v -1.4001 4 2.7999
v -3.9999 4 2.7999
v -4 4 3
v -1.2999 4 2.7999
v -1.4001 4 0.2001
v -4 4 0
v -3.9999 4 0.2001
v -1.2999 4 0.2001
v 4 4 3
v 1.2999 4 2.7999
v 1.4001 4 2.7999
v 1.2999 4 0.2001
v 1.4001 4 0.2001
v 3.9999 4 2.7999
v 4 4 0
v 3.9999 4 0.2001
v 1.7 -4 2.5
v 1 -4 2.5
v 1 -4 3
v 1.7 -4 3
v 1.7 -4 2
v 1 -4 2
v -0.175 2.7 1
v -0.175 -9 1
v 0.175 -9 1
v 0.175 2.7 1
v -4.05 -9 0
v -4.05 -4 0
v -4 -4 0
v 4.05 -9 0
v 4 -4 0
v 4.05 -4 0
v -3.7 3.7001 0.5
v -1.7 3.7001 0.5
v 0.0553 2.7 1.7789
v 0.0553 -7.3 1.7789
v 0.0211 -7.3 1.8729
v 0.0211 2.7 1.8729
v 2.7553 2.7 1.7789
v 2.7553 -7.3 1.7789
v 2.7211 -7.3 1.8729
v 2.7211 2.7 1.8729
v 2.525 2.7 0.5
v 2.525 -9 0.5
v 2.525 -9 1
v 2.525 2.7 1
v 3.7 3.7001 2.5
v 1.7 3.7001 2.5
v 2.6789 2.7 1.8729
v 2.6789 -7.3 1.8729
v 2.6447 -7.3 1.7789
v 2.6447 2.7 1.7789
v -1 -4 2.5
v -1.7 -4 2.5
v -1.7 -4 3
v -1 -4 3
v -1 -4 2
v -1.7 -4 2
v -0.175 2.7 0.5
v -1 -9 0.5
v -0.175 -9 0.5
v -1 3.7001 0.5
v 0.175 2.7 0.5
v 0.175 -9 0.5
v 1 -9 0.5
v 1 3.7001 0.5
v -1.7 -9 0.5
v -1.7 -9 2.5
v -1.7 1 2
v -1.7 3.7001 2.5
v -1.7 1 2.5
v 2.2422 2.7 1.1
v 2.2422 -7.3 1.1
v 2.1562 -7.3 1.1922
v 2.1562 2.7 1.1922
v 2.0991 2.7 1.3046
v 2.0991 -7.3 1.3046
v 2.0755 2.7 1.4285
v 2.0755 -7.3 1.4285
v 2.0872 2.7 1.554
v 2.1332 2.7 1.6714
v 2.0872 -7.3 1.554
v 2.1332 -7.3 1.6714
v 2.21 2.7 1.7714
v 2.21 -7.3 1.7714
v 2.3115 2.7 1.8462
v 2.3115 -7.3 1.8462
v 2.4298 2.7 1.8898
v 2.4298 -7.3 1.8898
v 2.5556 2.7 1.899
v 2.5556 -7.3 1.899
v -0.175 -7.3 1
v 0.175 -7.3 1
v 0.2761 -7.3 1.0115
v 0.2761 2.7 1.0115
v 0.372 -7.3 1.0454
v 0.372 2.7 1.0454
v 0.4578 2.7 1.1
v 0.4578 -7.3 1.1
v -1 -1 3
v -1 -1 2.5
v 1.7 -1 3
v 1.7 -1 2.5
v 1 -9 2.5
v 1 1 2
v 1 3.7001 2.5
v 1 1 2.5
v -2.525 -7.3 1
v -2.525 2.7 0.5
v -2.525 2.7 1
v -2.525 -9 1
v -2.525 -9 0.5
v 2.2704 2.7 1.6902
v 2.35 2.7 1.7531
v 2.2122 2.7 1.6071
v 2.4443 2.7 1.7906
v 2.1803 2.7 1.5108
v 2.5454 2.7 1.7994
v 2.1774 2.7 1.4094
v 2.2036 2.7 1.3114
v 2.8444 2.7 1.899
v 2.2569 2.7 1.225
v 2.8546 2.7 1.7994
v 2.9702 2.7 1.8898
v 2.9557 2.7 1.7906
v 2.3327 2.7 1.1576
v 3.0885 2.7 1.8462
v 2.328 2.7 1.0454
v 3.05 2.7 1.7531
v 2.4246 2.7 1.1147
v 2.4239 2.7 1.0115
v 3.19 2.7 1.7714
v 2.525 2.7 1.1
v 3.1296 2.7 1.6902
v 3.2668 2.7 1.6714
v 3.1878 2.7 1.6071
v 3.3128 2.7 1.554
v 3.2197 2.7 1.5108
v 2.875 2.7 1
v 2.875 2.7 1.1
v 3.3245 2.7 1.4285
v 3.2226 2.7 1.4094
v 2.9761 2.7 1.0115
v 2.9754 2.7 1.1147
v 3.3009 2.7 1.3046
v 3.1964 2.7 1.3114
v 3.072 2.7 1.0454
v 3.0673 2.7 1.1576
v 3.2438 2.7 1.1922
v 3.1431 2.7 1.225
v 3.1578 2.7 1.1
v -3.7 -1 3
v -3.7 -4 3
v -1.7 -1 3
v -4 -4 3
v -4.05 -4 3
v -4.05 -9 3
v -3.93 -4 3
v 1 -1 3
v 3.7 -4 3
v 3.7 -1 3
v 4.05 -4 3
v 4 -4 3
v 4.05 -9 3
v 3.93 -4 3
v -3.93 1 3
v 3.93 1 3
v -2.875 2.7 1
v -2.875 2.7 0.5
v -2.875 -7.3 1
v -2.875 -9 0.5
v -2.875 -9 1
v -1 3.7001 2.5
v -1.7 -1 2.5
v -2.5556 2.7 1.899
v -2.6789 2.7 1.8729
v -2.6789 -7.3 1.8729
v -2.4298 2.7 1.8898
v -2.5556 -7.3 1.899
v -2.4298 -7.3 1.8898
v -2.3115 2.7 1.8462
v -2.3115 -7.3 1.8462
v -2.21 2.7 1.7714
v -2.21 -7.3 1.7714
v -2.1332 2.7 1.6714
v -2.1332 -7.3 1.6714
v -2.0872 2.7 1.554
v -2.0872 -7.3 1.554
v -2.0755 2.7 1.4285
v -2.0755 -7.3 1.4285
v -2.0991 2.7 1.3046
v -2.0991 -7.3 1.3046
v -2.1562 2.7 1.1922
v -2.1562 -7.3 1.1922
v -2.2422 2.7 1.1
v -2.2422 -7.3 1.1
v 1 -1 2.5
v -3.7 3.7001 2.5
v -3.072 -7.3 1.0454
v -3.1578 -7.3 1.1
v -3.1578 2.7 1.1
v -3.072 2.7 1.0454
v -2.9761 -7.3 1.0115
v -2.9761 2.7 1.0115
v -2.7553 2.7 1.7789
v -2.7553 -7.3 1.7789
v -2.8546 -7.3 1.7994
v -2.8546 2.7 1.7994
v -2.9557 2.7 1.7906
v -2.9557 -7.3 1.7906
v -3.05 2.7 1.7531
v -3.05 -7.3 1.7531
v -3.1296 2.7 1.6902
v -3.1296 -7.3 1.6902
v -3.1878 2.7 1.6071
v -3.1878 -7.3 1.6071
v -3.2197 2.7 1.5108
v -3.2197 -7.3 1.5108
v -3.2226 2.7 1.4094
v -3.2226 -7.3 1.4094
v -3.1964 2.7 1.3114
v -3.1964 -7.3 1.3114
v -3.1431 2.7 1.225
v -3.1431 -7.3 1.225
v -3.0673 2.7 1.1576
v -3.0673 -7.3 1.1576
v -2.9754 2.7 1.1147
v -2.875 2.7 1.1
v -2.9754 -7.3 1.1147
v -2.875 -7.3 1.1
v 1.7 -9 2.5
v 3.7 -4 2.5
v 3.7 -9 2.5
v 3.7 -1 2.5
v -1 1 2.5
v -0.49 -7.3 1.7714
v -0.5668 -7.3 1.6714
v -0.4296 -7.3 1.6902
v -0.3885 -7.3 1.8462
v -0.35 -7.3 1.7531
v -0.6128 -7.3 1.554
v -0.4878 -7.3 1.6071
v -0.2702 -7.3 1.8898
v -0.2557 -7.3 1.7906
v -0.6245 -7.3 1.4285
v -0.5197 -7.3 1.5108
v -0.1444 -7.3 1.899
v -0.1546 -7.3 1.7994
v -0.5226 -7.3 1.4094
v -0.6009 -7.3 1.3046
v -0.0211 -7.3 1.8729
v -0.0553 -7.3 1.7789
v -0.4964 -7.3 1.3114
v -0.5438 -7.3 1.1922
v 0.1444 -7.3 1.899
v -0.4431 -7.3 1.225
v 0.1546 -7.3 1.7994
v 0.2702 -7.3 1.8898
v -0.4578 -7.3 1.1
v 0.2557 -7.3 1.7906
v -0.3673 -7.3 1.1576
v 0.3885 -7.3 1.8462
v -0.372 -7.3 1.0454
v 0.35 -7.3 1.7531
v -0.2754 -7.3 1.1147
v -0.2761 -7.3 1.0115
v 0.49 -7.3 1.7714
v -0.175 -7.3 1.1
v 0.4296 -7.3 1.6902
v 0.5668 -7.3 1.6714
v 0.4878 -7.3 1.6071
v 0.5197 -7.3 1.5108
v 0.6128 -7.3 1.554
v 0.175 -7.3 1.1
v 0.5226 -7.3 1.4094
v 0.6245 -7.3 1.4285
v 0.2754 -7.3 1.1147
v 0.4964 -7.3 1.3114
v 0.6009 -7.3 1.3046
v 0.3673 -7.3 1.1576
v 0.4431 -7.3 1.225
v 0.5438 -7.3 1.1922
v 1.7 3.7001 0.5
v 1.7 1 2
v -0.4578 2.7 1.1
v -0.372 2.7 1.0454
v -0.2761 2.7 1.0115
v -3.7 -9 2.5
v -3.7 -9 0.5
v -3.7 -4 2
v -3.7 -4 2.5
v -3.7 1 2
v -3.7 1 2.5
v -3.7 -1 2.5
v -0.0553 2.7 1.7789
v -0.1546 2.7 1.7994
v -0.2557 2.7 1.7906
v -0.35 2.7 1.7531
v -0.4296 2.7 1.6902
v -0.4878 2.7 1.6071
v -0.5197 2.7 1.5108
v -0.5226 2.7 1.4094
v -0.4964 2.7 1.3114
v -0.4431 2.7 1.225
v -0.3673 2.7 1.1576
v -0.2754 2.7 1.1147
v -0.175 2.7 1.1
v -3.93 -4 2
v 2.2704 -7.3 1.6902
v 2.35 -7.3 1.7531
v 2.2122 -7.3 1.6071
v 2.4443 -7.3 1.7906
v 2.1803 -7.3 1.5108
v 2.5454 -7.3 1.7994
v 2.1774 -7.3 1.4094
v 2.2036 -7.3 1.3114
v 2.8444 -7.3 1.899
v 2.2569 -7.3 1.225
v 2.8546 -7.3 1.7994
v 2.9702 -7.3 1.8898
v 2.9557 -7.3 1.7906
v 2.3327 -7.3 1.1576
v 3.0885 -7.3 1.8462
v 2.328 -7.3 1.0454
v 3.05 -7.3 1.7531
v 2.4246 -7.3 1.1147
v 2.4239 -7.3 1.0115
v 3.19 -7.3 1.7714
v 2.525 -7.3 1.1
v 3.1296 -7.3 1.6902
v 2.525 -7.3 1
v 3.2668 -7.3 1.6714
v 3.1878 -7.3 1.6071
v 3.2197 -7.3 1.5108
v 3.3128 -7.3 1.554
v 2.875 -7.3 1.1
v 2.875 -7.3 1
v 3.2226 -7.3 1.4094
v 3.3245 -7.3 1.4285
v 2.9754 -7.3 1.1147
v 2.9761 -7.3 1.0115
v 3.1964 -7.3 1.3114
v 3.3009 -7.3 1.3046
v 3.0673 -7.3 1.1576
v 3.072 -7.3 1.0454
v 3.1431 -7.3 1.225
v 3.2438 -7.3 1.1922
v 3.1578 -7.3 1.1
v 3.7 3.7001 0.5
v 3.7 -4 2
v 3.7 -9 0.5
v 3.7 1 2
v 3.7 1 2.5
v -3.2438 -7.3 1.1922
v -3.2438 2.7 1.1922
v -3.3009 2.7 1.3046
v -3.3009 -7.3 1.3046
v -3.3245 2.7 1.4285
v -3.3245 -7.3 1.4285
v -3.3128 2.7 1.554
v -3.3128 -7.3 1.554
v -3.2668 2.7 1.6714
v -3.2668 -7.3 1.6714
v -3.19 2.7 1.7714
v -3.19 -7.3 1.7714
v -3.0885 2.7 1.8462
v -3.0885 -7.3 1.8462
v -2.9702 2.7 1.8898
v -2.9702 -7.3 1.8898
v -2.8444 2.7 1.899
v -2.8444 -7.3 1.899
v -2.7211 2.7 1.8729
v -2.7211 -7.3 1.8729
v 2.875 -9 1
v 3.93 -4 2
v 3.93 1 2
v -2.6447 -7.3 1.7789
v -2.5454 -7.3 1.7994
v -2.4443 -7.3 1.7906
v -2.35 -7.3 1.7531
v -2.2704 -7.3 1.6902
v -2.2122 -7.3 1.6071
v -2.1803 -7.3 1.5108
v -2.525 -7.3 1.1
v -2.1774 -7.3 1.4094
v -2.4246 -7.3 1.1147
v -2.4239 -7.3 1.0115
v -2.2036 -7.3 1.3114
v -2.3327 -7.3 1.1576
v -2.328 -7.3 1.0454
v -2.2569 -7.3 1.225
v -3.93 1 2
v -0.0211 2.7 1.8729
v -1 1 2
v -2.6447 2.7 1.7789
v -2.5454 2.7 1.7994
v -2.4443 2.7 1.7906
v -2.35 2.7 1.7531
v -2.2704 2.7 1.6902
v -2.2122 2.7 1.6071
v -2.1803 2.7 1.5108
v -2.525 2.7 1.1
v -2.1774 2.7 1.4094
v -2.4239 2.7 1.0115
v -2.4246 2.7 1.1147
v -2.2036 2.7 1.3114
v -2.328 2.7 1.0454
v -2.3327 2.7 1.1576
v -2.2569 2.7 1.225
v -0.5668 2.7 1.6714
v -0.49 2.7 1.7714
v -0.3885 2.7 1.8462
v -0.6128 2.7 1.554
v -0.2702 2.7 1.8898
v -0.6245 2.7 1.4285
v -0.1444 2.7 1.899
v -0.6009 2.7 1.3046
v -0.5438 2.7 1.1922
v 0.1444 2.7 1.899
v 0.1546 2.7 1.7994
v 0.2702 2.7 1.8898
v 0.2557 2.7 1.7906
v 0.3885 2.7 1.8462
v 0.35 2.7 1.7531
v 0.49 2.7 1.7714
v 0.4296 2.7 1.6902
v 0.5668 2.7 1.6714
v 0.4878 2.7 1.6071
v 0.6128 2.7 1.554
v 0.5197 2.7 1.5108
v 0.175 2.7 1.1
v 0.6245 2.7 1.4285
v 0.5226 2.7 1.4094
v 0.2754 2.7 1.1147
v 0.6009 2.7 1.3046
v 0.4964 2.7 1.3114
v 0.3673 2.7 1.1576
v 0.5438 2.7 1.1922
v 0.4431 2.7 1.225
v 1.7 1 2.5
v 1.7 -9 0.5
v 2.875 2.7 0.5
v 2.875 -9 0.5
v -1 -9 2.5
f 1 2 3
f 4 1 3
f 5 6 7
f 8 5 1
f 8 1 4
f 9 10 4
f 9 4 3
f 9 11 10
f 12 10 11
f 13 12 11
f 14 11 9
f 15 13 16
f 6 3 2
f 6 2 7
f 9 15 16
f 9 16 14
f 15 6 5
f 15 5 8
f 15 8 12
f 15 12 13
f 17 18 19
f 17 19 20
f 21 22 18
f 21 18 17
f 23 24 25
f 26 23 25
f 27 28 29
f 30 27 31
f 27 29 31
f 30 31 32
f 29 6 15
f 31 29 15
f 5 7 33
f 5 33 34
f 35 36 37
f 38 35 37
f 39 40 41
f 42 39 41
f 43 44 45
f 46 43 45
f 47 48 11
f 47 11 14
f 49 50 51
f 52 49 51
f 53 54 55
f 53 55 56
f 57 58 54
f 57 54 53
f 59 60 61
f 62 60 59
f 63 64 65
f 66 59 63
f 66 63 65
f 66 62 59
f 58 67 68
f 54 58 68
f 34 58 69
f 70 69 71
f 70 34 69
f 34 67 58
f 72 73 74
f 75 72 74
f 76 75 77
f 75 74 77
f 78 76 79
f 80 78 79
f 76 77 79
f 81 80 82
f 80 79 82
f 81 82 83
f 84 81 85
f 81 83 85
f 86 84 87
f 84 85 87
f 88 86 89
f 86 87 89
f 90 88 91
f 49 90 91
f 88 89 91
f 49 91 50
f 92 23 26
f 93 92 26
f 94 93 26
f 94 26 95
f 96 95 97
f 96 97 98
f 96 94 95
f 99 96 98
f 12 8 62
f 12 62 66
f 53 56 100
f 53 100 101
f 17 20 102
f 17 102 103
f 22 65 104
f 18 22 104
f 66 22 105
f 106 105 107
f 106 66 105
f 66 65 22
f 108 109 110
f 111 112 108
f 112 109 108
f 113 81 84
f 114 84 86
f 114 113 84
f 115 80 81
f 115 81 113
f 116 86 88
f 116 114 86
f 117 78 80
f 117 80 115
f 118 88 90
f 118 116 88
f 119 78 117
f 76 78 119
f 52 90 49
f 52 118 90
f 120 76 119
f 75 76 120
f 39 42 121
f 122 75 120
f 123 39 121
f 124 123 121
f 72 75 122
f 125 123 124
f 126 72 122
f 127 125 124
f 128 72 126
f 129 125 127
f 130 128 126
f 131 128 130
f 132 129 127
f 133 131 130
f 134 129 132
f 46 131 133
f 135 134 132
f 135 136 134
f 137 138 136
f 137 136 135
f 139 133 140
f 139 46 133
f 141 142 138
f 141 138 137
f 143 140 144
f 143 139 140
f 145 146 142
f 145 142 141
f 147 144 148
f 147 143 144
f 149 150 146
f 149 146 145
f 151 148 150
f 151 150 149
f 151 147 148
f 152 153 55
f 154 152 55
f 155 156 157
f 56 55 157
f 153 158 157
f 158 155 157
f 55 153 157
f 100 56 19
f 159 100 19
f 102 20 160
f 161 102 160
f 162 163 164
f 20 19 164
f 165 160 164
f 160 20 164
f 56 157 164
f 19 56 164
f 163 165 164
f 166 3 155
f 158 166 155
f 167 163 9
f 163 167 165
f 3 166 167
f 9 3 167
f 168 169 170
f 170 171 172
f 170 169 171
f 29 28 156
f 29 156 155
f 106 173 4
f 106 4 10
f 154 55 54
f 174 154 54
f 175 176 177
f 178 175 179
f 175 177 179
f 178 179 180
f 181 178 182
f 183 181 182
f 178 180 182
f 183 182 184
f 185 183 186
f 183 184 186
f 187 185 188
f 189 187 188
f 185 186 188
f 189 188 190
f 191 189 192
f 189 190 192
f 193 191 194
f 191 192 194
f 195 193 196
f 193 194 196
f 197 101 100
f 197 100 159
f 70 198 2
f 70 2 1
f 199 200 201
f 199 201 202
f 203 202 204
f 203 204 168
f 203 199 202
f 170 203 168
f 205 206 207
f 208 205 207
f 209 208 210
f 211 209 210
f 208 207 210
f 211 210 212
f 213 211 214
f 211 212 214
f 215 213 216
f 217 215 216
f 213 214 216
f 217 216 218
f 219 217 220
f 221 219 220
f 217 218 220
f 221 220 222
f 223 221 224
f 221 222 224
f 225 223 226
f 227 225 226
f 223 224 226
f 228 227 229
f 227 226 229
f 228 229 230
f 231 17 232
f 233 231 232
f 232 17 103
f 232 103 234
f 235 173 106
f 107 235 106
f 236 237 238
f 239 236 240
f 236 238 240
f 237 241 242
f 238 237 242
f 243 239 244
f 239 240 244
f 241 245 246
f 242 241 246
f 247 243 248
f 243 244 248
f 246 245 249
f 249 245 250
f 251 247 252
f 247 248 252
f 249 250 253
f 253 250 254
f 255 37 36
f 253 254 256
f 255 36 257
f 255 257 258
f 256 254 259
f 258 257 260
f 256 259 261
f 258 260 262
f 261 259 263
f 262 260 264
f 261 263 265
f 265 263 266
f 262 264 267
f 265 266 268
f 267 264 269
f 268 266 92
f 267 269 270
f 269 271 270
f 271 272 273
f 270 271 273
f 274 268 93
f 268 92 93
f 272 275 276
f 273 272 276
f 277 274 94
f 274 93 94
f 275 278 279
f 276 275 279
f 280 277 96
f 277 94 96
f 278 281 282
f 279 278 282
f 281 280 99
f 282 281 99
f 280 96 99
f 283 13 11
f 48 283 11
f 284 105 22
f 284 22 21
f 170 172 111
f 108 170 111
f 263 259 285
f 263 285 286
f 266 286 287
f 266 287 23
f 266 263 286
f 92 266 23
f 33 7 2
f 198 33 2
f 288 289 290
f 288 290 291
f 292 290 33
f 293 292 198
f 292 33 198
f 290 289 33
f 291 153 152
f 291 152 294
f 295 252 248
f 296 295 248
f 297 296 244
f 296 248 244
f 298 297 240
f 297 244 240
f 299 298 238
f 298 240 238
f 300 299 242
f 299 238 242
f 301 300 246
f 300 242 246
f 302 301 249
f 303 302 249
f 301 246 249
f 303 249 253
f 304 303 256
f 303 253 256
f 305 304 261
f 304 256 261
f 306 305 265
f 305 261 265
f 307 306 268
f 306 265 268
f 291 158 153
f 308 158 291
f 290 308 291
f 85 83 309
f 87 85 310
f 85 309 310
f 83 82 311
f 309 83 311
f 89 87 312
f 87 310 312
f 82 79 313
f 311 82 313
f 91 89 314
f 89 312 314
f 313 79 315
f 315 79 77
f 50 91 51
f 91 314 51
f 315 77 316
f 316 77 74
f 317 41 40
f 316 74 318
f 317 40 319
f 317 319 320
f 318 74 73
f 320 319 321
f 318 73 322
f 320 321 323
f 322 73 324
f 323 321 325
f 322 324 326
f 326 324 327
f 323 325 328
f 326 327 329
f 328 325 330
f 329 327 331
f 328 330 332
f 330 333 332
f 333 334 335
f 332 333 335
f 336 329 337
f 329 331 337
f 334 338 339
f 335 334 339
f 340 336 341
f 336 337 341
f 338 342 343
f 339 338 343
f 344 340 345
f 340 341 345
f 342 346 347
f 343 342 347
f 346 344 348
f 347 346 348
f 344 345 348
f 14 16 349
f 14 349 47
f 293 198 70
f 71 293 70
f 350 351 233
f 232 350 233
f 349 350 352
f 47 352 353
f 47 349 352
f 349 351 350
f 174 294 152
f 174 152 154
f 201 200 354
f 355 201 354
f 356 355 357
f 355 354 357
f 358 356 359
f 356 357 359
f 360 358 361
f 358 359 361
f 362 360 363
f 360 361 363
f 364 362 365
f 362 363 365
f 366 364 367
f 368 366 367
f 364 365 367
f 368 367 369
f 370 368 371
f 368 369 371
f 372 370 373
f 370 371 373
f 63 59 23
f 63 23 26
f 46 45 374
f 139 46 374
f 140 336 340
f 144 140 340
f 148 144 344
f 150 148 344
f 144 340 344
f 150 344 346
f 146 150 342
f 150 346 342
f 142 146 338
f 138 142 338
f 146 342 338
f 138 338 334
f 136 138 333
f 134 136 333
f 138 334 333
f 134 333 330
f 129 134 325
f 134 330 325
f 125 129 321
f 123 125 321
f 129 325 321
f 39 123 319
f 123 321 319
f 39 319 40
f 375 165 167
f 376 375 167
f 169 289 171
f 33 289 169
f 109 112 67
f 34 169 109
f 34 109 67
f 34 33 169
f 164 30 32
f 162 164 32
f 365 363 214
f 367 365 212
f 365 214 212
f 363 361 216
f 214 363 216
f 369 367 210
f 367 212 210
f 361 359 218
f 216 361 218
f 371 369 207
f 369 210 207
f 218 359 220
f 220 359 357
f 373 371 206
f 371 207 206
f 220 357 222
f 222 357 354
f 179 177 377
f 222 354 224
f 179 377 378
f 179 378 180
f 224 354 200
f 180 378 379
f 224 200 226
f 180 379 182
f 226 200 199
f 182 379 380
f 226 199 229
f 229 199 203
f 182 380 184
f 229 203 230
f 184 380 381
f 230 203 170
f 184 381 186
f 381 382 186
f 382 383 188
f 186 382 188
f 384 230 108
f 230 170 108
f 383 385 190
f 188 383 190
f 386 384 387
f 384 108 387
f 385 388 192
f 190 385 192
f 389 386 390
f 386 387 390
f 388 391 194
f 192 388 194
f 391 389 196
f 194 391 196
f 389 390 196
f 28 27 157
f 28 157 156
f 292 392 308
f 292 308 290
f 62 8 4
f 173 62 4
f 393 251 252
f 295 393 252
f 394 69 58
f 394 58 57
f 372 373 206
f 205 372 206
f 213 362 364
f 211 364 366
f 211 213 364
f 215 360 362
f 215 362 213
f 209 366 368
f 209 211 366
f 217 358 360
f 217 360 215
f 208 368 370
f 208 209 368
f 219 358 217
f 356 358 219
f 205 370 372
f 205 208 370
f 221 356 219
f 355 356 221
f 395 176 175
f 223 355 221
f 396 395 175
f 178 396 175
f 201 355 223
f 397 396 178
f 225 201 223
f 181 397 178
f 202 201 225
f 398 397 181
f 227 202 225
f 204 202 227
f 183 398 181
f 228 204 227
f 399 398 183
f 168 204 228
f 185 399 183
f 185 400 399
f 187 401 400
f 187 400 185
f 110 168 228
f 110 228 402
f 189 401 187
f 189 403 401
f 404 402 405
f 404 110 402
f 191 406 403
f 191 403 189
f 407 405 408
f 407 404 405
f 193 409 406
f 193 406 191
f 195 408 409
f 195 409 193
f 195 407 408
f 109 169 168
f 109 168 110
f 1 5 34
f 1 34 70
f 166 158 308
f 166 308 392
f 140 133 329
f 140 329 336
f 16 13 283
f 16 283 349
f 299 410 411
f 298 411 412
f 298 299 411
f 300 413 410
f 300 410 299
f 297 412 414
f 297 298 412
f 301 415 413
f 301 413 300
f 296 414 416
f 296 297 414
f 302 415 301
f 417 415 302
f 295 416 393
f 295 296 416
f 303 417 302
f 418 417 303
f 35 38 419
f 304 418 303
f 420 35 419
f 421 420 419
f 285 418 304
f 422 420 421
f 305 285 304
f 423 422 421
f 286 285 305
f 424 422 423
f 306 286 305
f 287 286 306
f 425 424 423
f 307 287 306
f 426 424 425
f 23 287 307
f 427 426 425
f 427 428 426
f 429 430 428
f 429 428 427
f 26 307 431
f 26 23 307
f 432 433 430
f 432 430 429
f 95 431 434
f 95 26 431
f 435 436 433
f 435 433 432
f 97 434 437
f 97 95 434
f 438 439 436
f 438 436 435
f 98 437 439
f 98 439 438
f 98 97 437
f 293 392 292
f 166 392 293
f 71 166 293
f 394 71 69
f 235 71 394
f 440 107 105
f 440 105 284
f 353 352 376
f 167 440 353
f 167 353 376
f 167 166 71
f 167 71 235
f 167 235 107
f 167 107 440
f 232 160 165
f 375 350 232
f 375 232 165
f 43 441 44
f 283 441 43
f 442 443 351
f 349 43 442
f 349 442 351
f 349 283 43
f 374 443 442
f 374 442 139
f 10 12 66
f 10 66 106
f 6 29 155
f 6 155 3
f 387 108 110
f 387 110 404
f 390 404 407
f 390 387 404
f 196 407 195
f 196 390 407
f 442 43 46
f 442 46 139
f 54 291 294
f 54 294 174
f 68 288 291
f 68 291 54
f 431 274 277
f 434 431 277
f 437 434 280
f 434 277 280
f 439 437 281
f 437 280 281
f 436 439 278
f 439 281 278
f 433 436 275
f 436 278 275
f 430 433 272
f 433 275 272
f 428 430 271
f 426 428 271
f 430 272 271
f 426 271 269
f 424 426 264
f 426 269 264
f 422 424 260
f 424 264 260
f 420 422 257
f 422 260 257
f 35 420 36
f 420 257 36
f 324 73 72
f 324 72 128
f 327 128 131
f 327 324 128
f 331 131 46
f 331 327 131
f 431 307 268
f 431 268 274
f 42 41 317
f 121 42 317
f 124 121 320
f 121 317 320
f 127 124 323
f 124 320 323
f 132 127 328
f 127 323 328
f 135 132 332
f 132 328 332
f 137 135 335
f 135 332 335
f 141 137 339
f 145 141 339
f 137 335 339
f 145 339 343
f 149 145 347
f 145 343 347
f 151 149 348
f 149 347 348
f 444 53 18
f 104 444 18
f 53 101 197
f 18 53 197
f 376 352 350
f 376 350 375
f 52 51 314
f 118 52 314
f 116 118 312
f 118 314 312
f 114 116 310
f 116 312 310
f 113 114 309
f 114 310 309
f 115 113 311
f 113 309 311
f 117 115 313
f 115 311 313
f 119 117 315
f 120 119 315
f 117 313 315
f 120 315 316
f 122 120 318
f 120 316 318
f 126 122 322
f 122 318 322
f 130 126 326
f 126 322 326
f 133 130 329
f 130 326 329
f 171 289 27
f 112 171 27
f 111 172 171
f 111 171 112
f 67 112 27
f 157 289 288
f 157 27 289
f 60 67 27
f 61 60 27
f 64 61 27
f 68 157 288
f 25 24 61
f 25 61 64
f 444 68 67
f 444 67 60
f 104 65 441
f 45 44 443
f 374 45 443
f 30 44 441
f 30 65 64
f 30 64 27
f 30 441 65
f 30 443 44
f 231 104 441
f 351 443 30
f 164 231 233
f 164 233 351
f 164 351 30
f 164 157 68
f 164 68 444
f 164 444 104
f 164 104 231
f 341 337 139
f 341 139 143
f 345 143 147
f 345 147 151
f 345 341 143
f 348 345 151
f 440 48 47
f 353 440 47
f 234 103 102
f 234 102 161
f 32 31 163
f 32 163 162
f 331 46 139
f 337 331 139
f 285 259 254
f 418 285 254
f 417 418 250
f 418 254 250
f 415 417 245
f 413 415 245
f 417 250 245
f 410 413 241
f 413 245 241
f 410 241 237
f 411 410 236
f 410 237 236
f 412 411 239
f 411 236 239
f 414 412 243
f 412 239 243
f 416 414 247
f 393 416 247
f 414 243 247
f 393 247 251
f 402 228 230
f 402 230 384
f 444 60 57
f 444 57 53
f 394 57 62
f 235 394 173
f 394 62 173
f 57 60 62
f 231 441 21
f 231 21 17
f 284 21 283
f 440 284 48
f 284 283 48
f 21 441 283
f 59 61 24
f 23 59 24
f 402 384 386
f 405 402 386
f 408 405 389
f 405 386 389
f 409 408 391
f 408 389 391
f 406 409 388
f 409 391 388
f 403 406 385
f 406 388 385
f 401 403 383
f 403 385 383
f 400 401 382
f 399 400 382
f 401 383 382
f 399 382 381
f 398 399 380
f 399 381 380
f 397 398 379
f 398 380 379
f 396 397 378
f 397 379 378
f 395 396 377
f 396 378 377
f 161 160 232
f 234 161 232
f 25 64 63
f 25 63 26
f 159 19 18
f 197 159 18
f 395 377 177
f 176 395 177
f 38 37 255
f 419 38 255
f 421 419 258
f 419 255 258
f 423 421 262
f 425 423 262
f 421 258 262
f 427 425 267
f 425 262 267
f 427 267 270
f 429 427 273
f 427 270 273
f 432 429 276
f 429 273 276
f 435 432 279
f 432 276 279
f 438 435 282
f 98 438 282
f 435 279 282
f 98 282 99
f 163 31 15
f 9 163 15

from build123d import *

# Parameters (mm, degrees)
SCHIZZO1_W                        = 8
SCHIZZO1_H                        = 8
ESTRUSIONE_ESTRUSIONE1_DEPTH      = 3
SCHIZZO2_W                        = 7.86
SCHIZZO2_H                        = 5
TAGLIO_ESTRUSIONE2_DEPTH          = 1
ESTRUSIONE_ESTRUSIONE2_DEPTH      = 1
ESTRUSIONE_ESTRUSIONE2_DEPTH_BACK = 2
SCHIZZO4_W                        = 8.1
SCHIZZO4_H                        = 5
TAGLIO_ESTRUSIONE3_DEPTH          = 14.942829698
TAGLIO_ESTRUSIONE3_DEPTH_BACK     = 14.942829698
SCHIZZO5_W                        = 2
SCHIZZO5_H                        = 2
SMUSSO2_SIZE                      = 0.3
SCHIZZO6_W                        = 2
SCHIZZO6_H                        = 0.5
ESTRUSIONE_ESTRUSIONE4_DEPTH      = 3
SCHIZZO7_W                        = 1.25
SCHIZZO7_H                        = 10
BASE_FLANGIA1_DEPTH               = 0.1
ORLO1_START                       = -7.3
ORLO1_DEPTH                       = 10
ORLO1_2_DEPTH                     = 10
ORLO2_START                       = -7.3
ORLO2_DEPTH                       = 10
ORLO2_2_DEPTH                     = 10
SCHIZZO17_W                       = 1.25
SCHIZZO17_H                       = 10
BASE_FLANGIA2_DEPTH               = 0.1
ORLO3_START                       = -7.3
ORLO3_DEPTH                       = 10
ORLO3_2_DEPTH                     = 10
SCHIZZO26_W                       = 1.25
SCHIZZO26_H                       = 10
BASE_FLANGIA3_DEPTH               = 0.1
ORLO4_START                       = -7.3
ORLO4_DEPTH                       = 10
ORLO4_2_DEPTH                     = 10
ORLO5_START                       = -7.3
ORLO5_DEPTH                       = 10
ORLO5_2_DEPTH                     = 10
ESTRUSIONE_ESTRUSIONE5_REACH      = 15.943
SCHIZZO37_W                       = 0.35
SCHIZZO37_H                       = 0.5


# Read off the part's stored shape, not the designer's step: Orlo1, Orlo2, Orlo3, Orlo4, Orlo5
# Sheet-metal steps are written as plain solids
with BuildPart() as part:
    # Schizzo1 → Estrusione-Estrusione1 (new body)
    with BuildSketch(Plane.XY):
        Rectangle(SCHIZZO1_W, SCHIZZO1_H)
    extrude(amount=ESTRUSIONE_ESTRUSIONE1_DEPTH)

    # Schizzo2 → Taglio-Estrusione2 (cut)
    with BuildSketch(Plane.XY.offset(3)):
        with Locations((0, -1.5)):
            Rectangle(SCHIZZO2_W, SCHIZZO2_H)
    extrude(amount=-TAGLIO_ESTRUSIONE2_DEPTH, mode=Mode.SUBTRACT)

    # Schizzo4 → Estrusione-Estrusione2 (add, two sides: drawn at the far end of the back side and taken through both)
    with BuildSketch(Plane.XY.offset(2).offset(-ESTRUSIONE_ESTRUSIONE2_DEPTH_BACK)):
        with Locations((0, -6.5)):
            Rectangle(SCHIZZO4_W, SCHIZZO4_H)
    extrude(amount=ESTRUSIONE_ESTRUSIONE2_DEPTH + ESTRUSIONE_ESTRUSIONE2_DEPTH_BACK)

    # Schizzo5 → Taglio-Estrusione3 (cut, two sides: drawn at the far end of the back side and taken through both)
    with BuildSketch(Plane.XZ.offset(9).offset(-TAGLIO_ESTRUSIONE3_DEPTH_BACK)):
        with Locations((-2.7, 1.5)):
            Rectangle(SCHIZZO5_W, SCHIZZO5_H)
        with Locations((0, 1.5)):
            Rectangle(SCHIZZO5_W, SCHIZZO5_H)
        with Locations((2.7, 1.5)):
            Rectangle(SCHIZZO5_W, SCHIZZO5_H)
    extrude(amount=TAGLIO_ESTRUSIONE3_DEPTH + TAGLIO_ESTRUSIONE3_DEPTH_BACK, mode=Mode.SUBTRACT)

    # Smusso2
    smusso2_edges = [part.edges().sort_by_distance(p)[0] for p in [
        (0, 4, 2.5),
        (0, 4, 0.5),
        (3.7, 4, 1.5),
        (1.7, 4, 1.5),
        (2.7, 4, 2.5),
        (2.7, 4, 0.5),
        (-1.7, 4, 1.5),
        (-3.7, 4, 1.5),
        (-2.7, 4, 2.5),
        (-2.7, 4, 0.5),
        (1, 4, 1.5),
        (-1, 4, 1.5),
    ]]
    chamfer(smusso2_edges, length=SMUSSO2_SIZE - 0.0001)  # a hair under: the kernel refuses the full size

    # Schizzo6 → Estrusione-Estrusione4 (add)
    with BuildSketch(Plane(origin=(0, -4, 0), x_dir=(1, 0, 0), z_dir=(0, 1, 0))):
        with Locations((-2.7, -2.75)):
            Rectangle(SCHIZZO6_W, SCHIZZO6_H)
        with Locations((0, -2.75)):
            Rectangle(SCHIZZO6_W, SCHIZZO6_H)
        with Locations((2.7, -2.75)):
            Rectangle(SCHIZZO6_W, SCHIZZO6_H)
    extrude(amount=ESTRUSIONE_ESTRUSIONE4_DEPTH)


with BuildPart() as body_2:
    # Schizzo7 → Base-Flangia1 (new body)
    with BuildSketch(Plane.XY.offset(1)):
        with Locations((-2.7, -2.3)):
            Rectangle(SCHIZZO7_W, SCHIZZO7_H)
    extrude(amount=BASE_FLANGIA1_DEPTH)

    # Orlo1 outline → Orlo1 (cut)
    with BuildSketch(Plane(origin=(0, 0, 0), x_dir=(1, 0, 0), z_dir=(0, 1, 0)).offset(ORLO1_START)):
        with BuildLine():
            ThreePointArc((-2.525, -1), (-2.375, -1.025735931), (-2.242157287, -1.1))
            Line((-2.242157287, -1.1), (-2.075, -1.1))
            Line((-2.075, -1.1), (-2.075, -1))
            Line((-2.075, -1), (-2.525, -1))
        make_face()
    extrude(amount=ORLO1_DEPTH, mode=Mode.SUBTRACT)

    # Orlo1 2 outline → Orlo1 2 (add)
    with BuildSketch(Plane(origin=(0, 0, 0), x_dir=(1, 0, 0), z_dir=(0, 1, 0)).offset(ORLO1_START)):
        with BuildLine():
            Line((-2.64470705, -1.778892417), (-2.678909064, -1.872861679))
            ThreePointArc((-2.678909064, -1.872861679), (-2.133228682, -1.671393845), (-2.242157287, -1.1))
            Line((-2.242157287, -1.1), (-2.525, -1.1))
            ThreePointArc((-2.525, -1.1), (-2.180317286, -1.510776862), (-2.64470705, -1.778892417))
        make_face()
    extrude(amount=ORLO1_2_DEPTH)

    # Orlo2 outline → Orlo2 (cut)
    with BuildSketch(Plane(origin=(0, 0, 0), x_dir=(1, 0, 0), z_dir=(0, 1, 0)).offset(ORLO2_START)):
        with BuildLine():
            Line((-3.325, -1.1), (-3.157842713, -1.1))
            ThreePointArc((-3.157842713, -1.1), (-3.025, -1.025735931), (-2.875, -1))
            Line((-2.875, -1), (-3.325, -1))
            Line((-3.325, -1), (-3.325, -1.1))
        make_face()
    extrude(amount=ORLO2_DEPTH, mode=Mode.SUBTRACT)

    # Orlo2 2 outline → Orlo2 2 (add)
    with BuildSketch(Plane(origin=(0, 0, 0), x_dir=(1, 0, 0), z_dir=(0, 1, 0)).offset(ORLO2_START)):
        with BuildLine():
            Line((-2.721090936, -1.872861679), (-2.75529295, -1.778892417))
            ThreePointArc((-2.75529295, -1.778892417), (-3.219682714, -1.510776862), (-2.875, -1.1))
            Line((-2.875, -1.1), (-3.157842713, -1.1))
            ThreePointArc((-3.157842713, -1.1), (-3.266771318, -1.671393845), (-2.721090936, -1.872861679))
        make_face()
    extrude(amount=ORLO2_2_DEPTH)

    # Estrusione-Estrusione5: up to this face of the body (flat: up to its plane)
    estrusione_estrusione5_end = Plane(body_2.part.faces().sort_by_distance((-2.7, 2.7, 1.015402922))[0])
    # Schizzo37 → Estrusione-Estrusione5 (add, up to the picked face)
    with BuildSketch(Plane.XZ.offset(9), mode=Mode.PRIVATE) as estrusione_estrusione5_sk1:
        with Locations((-2.7, 0.75)):
            Rectangle(SCHIZZO37_W, SCHIZZO37_H)
    estrusione_estrusione5_tool1 = split(extrude(estrusione_estrusione5_sk1.sketch, amount=-ESTRUSIONE_ESTRUSIONE5_REACH, mode=Mode.PRIVATE), bisect_by=estrusione_estrusione5_end, keep=Keep.BOTH, mode=Mode.PRIVATE)
    # Schizzo37 → Estrusione-Estrusione5 (add, up to the picked face)
    with BuildSketch(Plane.XZ.offset(9), mode=Mode.PRIVATE) as estrusione_estrusione5_sk2:
        with Locations((2.7, 0.75)):
            Rectangle(SCHIZZO37_W, SCHIZZO37_H)
    estrusione_estrusione5_tool2 = split(extrude(estrusione_estrusione5_sk2.sketch, amount=-ESTRUSIONE_ESTRUSIONE5_REACH, mode=Mode.PRIVATE), bisect_by=estrusione_estrusione5_end, keep=Keep.BOTH, mode=Mode.PRIVATE)
    # Schizzo37 → Estrusione-Estrusione5 (add, up to the picked face)
    with BuildSketch(Plane.XZ.offset(9), mode=Mode.PRIVATE) as estrusione_estrusione5_sk3:
        with Locations((0, 0.75)):
            Rectangle(SCHIZZO37_W, SCHIZZO37_H)
    estrusione_estrusione5_tool3 = split(extrude(estrusione_estrusione5_sk3.sketch, amount=-ESTRUSIONE_ESTRUSIONE5_REACH, mode=Mode.PRIVATE), bisect_by=estrusione_estrusione5_end, keep=Keep.BOTH, mode=Mode.PRIVATE)

    add(part.part)  # Estrusione-Estrusione5 merges part
    add(estrusione_estrusione5_tool1.solids().sort_by(Axis((-2.7, -9, 0.75), (0, 1, 0)))[0])
    add(estrusione_estrusione5_tool2.solids().sort_by(Axis((2.7, -9, 0.75), (0, 1, 0)))[0])
    add(estrusione_estrusione5_tool3.solids().sort_by(Axis((0, -9, 0.75), (0, 1, 0)))[0])


with BuildPart() as body_3:
    # Schizzo17 → Base-Flangia2 (new body)
    with BuildSketch(Plane.XY.offset(1)):
        with Locations((0, -2.3)):
            Rectangle(SCHIZZO17_W, SCHIZZO17_H)
    extrude(amount=BASE_FLANGIA2_DEPTH)

    # Orlo3 outline → Orlo3 (cut)
    with BuildSketch(Plane(origin=(0, 0, 0), x_dir=(1, 0, 0), z_dir=(0, 1, 0)).offset(ORLO3_START)):
        with BuildLine():
            Line((-0.625, -1.1), (-0.457842713, -1.1))
            ThreePointArc((-0.457842713, -1.1), (-0.325, -1.025735931), (-0.175, -1))
            Line((-0.175, -1), (-0.625, -1))
            Line((-0.625, -1), (-0.625, -1.1))
        make_face()
        with BuildLine():
            ThreePointArc((0.175, -1), (0.325, -1.025735931), (0.457842713, -1.1))
            Line((0.457842713, -1.1), (0.625, -1.1))
            Line((0.625, -1.1), (0.625, -1))
            Line((0.625, -1), (0.175, -1))
        make_face()
    extrude(amount=ORLO3_DEPTH, mode=Mode.SUBTRACT)

    # Orlo3 2 outline → Orlo3 2 (add)
    with BuildSketch(Plane(origin=(0, 0, 0), x_dir=(1, 0, 0), z_dir=(0, 1, 0)).offset(ORLO3_START)):
        with BuildLine():
            Line((-0.021090936, -1.872861679), (-0.05529295, -1.778892417))
            ThreePointArc((-0.05529295, -1.778892417), (-0.519682714, -1.510776862), (-0.175, -1.1))
            Line((-0.175, -1.1), (-0.457842713, -1.1))
            ThreePointArc((-0.457842713, -1.1), (-0.566771318, -1.671393845), (-0.021090936, -1.872861679))
        make_face()
        with BuildLine():
            Line((0.457842713, -1.1), (0.175, -1.1))
            ThreePointArc((0.175, -1.1), (0.519682714, -1.510776862), (0.05529295, -1.778892417))
            Line((0.05529295, -1.778892417), (0.021090936, -1.872861679))
            ThreePointArc((0.021090936, -1.872861679), (0.566771318, -1.671393845), (0.457842713, -1.1))
        make_face()
    extrude(amount=ORLO3_2_DEPTH)


with BuildPart() as body_4:
    # Schizzo26 → Base-Flangia3 (new body)
    with BuildSketch(Plane.XY.offset(1)):
        with Locations((2.7, -2.3)):
            Rectangle(SCHIZZO26_W, SCHIZZO26_H)
    extrude(amount=BASE_FLANGIA3_DEPTH)

    # Orlo4 outline → Orlo4 (cut)
    with BuildSketch(Plane(origin=(0, 0, 0), x_dir=(1, 0, 0), z_dir=(0, 1, 0)).offset(ORLO4_START)):
        with BuildLine():
            ThreePointArc((2.875, -1), (3.025, -1.025735931), (3.157842713, -1.1))
            Line((3.157842713, -1.1), (3.325, -1.1))
            Line((3.325, -1.1), (3.325, -1))
            Line((3.325, -1), (2.875, -1))
        make_face()
    extrude(amount=ORLO4_DEPTH, mode=Mode.SUBTRACT)

    # Orlo4 2 outline → Orlo4 2 (add)
    with BuildSketch(Plane(origin=(0, 0, 0), x_dir=(1, 0, 0), z_dir=(0, 1, 0)).offset(ORLO4_START)):
        with BuildLine():
            Line((2.75529295, -1.778892417), (2.721090936, -1.872861679))
            ThreePointArc((2.721090936, -1.872861679), (3.266771318, -1.671393845), (3.157842713, -1.1))
            Line((3.157842713, -1.1), (2.875, -1.1))
            ThreePointArc((2.875, -1.1), (3.219682714, -1.510776862), (2.75529295, -1.778892417))
        make_face()
    extrude(amount=ORLO4_2_DEPTH)

    # Orlo5 outline → Orlo5 (cut)
    with BuildSketch(Plane(origin=(0, 0, 0), x_dir=(1, 0, 0), z_dir=(0, 1, 0)).offset(ORLO5_START)):
        with BuildLine():
            Line((2.075, -1.1), (2.242157287, -1.1))
            ThreePointArc((2.242157287, -1.1), (2.375, -1.025735931), (2.525, -1))
            Line((2.525, -1), (2.075, -1))
            Line((2.075, -1), (2.075, -1.1))
        make_face()
    extrude(amount=ORLO5_DEPTH, mode=Mode.SUBTRACT)

    # Orlo5 2 outline → Orlo5 2 (add)
    with BuildSketch(Plane(origin=(0, 0, 0), x_dir=(1, 0, 0), z_dir=(0, 1, 0)).offset(ORLO5_START)):
        with BuildLine():
            Line((2.678909064, -1.872861679), (2.64470705, -1.778892417))
            ThreePointArc((2.64470705, -1.778892417), (2.180317286, -1.510776862), (2.525, -1.1))
            Line((2.525, -1.1), (2.242157287, -1.1))
            ThreePointArc((2.242157287, -1.1), (2.133228682, -1.671393845), (2.678909064, -1.872861679))
        make_face()
    extrude(amount=ORLO5_2_DEPTH)


solid = Compound([body_2.part, body_3.part, body_4.part])
